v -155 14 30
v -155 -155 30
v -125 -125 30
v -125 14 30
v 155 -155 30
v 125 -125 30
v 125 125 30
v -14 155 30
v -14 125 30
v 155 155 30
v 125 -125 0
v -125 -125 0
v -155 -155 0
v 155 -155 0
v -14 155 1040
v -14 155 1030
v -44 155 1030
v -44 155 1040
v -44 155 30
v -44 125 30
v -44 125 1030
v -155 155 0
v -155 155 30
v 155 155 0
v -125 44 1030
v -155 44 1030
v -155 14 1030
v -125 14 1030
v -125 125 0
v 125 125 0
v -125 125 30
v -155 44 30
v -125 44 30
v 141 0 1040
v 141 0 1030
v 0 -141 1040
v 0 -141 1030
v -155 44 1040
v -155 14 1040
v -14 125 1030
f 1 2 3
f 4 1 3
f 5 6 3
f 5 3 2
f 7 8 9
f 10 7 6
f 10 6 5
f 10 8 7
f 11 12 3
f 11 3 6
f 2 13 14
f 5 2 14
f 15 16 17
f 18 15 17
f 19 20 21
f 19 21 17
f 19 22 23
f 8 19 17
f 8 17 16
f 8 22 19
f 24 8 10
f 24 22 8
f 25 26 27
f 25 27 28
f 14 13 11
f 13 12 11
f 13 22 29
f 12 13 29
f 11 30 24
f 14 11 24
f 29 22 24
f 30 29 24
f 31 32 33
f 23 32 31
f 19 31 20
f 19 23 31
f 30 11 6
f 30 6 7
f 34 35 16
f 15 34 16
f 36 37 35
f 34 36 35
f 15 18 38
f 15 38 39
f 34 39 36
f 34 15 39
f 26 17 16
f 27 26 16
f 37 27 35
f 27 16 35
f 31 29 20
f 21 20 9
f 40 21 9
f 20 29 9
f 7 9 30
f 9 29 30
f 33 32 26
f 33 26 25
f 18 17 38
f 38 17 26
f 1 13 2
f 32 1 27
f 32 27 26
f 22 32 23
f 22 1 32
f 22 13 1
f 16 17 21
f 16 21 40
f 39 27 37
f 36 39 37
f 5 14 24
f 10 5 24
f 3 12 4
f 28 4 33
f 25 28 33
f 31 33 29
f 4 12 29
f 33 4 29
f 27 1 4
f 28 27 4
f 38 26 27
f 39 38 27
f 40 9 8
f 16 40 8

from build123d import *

# Parameters (mm, degrees)
F0_W     = 310
F0_H     = 310
F0_W_2   = 250
F0_H_2   = 250
F1_DEPTH = 30
F2_W     = 30
F2_H     = 30
F3_DEPTH = 1000
F5_DEPTH = 10


with BuildPart() as f1:
    # F0 (on Top) → F1 (new body)
    with BuildSketch(Plane.XY):
        Rectangle(F0_W, F0_H)
        Rectangle(F0_W_2, F0_H_2, mode=Mode.SUBTRACT)
    extrude(amount=F1_DEPTH)

    # F2 (on face) → F3 (join)
    with BuildSketch(Plane.XY.offset(30)):
        with Locations((-29, 140)):
            Rectangle(F2_W, F2_H)
        with Locations((-140, 29)):
            Rectangle(F2_W, F2_H)
    extrude(amount=F3_DEPTH)


with BuildPart() as f5:
    # F4 (on face) → F5 (new body)
    with BuildSketch(Plane.XY.offset(1030)):
        Polygon((-43.9997917029, 155.0002082971), (-155, 44), (-155, 14), (0.0002082971, -141.0002082971), (141.0004165942, 0), (-13.9997917029, 155.0002082971), align=None)
    extrude(amount=F5_DEPTH)


solid = Compound([f1.part, f5.part])
